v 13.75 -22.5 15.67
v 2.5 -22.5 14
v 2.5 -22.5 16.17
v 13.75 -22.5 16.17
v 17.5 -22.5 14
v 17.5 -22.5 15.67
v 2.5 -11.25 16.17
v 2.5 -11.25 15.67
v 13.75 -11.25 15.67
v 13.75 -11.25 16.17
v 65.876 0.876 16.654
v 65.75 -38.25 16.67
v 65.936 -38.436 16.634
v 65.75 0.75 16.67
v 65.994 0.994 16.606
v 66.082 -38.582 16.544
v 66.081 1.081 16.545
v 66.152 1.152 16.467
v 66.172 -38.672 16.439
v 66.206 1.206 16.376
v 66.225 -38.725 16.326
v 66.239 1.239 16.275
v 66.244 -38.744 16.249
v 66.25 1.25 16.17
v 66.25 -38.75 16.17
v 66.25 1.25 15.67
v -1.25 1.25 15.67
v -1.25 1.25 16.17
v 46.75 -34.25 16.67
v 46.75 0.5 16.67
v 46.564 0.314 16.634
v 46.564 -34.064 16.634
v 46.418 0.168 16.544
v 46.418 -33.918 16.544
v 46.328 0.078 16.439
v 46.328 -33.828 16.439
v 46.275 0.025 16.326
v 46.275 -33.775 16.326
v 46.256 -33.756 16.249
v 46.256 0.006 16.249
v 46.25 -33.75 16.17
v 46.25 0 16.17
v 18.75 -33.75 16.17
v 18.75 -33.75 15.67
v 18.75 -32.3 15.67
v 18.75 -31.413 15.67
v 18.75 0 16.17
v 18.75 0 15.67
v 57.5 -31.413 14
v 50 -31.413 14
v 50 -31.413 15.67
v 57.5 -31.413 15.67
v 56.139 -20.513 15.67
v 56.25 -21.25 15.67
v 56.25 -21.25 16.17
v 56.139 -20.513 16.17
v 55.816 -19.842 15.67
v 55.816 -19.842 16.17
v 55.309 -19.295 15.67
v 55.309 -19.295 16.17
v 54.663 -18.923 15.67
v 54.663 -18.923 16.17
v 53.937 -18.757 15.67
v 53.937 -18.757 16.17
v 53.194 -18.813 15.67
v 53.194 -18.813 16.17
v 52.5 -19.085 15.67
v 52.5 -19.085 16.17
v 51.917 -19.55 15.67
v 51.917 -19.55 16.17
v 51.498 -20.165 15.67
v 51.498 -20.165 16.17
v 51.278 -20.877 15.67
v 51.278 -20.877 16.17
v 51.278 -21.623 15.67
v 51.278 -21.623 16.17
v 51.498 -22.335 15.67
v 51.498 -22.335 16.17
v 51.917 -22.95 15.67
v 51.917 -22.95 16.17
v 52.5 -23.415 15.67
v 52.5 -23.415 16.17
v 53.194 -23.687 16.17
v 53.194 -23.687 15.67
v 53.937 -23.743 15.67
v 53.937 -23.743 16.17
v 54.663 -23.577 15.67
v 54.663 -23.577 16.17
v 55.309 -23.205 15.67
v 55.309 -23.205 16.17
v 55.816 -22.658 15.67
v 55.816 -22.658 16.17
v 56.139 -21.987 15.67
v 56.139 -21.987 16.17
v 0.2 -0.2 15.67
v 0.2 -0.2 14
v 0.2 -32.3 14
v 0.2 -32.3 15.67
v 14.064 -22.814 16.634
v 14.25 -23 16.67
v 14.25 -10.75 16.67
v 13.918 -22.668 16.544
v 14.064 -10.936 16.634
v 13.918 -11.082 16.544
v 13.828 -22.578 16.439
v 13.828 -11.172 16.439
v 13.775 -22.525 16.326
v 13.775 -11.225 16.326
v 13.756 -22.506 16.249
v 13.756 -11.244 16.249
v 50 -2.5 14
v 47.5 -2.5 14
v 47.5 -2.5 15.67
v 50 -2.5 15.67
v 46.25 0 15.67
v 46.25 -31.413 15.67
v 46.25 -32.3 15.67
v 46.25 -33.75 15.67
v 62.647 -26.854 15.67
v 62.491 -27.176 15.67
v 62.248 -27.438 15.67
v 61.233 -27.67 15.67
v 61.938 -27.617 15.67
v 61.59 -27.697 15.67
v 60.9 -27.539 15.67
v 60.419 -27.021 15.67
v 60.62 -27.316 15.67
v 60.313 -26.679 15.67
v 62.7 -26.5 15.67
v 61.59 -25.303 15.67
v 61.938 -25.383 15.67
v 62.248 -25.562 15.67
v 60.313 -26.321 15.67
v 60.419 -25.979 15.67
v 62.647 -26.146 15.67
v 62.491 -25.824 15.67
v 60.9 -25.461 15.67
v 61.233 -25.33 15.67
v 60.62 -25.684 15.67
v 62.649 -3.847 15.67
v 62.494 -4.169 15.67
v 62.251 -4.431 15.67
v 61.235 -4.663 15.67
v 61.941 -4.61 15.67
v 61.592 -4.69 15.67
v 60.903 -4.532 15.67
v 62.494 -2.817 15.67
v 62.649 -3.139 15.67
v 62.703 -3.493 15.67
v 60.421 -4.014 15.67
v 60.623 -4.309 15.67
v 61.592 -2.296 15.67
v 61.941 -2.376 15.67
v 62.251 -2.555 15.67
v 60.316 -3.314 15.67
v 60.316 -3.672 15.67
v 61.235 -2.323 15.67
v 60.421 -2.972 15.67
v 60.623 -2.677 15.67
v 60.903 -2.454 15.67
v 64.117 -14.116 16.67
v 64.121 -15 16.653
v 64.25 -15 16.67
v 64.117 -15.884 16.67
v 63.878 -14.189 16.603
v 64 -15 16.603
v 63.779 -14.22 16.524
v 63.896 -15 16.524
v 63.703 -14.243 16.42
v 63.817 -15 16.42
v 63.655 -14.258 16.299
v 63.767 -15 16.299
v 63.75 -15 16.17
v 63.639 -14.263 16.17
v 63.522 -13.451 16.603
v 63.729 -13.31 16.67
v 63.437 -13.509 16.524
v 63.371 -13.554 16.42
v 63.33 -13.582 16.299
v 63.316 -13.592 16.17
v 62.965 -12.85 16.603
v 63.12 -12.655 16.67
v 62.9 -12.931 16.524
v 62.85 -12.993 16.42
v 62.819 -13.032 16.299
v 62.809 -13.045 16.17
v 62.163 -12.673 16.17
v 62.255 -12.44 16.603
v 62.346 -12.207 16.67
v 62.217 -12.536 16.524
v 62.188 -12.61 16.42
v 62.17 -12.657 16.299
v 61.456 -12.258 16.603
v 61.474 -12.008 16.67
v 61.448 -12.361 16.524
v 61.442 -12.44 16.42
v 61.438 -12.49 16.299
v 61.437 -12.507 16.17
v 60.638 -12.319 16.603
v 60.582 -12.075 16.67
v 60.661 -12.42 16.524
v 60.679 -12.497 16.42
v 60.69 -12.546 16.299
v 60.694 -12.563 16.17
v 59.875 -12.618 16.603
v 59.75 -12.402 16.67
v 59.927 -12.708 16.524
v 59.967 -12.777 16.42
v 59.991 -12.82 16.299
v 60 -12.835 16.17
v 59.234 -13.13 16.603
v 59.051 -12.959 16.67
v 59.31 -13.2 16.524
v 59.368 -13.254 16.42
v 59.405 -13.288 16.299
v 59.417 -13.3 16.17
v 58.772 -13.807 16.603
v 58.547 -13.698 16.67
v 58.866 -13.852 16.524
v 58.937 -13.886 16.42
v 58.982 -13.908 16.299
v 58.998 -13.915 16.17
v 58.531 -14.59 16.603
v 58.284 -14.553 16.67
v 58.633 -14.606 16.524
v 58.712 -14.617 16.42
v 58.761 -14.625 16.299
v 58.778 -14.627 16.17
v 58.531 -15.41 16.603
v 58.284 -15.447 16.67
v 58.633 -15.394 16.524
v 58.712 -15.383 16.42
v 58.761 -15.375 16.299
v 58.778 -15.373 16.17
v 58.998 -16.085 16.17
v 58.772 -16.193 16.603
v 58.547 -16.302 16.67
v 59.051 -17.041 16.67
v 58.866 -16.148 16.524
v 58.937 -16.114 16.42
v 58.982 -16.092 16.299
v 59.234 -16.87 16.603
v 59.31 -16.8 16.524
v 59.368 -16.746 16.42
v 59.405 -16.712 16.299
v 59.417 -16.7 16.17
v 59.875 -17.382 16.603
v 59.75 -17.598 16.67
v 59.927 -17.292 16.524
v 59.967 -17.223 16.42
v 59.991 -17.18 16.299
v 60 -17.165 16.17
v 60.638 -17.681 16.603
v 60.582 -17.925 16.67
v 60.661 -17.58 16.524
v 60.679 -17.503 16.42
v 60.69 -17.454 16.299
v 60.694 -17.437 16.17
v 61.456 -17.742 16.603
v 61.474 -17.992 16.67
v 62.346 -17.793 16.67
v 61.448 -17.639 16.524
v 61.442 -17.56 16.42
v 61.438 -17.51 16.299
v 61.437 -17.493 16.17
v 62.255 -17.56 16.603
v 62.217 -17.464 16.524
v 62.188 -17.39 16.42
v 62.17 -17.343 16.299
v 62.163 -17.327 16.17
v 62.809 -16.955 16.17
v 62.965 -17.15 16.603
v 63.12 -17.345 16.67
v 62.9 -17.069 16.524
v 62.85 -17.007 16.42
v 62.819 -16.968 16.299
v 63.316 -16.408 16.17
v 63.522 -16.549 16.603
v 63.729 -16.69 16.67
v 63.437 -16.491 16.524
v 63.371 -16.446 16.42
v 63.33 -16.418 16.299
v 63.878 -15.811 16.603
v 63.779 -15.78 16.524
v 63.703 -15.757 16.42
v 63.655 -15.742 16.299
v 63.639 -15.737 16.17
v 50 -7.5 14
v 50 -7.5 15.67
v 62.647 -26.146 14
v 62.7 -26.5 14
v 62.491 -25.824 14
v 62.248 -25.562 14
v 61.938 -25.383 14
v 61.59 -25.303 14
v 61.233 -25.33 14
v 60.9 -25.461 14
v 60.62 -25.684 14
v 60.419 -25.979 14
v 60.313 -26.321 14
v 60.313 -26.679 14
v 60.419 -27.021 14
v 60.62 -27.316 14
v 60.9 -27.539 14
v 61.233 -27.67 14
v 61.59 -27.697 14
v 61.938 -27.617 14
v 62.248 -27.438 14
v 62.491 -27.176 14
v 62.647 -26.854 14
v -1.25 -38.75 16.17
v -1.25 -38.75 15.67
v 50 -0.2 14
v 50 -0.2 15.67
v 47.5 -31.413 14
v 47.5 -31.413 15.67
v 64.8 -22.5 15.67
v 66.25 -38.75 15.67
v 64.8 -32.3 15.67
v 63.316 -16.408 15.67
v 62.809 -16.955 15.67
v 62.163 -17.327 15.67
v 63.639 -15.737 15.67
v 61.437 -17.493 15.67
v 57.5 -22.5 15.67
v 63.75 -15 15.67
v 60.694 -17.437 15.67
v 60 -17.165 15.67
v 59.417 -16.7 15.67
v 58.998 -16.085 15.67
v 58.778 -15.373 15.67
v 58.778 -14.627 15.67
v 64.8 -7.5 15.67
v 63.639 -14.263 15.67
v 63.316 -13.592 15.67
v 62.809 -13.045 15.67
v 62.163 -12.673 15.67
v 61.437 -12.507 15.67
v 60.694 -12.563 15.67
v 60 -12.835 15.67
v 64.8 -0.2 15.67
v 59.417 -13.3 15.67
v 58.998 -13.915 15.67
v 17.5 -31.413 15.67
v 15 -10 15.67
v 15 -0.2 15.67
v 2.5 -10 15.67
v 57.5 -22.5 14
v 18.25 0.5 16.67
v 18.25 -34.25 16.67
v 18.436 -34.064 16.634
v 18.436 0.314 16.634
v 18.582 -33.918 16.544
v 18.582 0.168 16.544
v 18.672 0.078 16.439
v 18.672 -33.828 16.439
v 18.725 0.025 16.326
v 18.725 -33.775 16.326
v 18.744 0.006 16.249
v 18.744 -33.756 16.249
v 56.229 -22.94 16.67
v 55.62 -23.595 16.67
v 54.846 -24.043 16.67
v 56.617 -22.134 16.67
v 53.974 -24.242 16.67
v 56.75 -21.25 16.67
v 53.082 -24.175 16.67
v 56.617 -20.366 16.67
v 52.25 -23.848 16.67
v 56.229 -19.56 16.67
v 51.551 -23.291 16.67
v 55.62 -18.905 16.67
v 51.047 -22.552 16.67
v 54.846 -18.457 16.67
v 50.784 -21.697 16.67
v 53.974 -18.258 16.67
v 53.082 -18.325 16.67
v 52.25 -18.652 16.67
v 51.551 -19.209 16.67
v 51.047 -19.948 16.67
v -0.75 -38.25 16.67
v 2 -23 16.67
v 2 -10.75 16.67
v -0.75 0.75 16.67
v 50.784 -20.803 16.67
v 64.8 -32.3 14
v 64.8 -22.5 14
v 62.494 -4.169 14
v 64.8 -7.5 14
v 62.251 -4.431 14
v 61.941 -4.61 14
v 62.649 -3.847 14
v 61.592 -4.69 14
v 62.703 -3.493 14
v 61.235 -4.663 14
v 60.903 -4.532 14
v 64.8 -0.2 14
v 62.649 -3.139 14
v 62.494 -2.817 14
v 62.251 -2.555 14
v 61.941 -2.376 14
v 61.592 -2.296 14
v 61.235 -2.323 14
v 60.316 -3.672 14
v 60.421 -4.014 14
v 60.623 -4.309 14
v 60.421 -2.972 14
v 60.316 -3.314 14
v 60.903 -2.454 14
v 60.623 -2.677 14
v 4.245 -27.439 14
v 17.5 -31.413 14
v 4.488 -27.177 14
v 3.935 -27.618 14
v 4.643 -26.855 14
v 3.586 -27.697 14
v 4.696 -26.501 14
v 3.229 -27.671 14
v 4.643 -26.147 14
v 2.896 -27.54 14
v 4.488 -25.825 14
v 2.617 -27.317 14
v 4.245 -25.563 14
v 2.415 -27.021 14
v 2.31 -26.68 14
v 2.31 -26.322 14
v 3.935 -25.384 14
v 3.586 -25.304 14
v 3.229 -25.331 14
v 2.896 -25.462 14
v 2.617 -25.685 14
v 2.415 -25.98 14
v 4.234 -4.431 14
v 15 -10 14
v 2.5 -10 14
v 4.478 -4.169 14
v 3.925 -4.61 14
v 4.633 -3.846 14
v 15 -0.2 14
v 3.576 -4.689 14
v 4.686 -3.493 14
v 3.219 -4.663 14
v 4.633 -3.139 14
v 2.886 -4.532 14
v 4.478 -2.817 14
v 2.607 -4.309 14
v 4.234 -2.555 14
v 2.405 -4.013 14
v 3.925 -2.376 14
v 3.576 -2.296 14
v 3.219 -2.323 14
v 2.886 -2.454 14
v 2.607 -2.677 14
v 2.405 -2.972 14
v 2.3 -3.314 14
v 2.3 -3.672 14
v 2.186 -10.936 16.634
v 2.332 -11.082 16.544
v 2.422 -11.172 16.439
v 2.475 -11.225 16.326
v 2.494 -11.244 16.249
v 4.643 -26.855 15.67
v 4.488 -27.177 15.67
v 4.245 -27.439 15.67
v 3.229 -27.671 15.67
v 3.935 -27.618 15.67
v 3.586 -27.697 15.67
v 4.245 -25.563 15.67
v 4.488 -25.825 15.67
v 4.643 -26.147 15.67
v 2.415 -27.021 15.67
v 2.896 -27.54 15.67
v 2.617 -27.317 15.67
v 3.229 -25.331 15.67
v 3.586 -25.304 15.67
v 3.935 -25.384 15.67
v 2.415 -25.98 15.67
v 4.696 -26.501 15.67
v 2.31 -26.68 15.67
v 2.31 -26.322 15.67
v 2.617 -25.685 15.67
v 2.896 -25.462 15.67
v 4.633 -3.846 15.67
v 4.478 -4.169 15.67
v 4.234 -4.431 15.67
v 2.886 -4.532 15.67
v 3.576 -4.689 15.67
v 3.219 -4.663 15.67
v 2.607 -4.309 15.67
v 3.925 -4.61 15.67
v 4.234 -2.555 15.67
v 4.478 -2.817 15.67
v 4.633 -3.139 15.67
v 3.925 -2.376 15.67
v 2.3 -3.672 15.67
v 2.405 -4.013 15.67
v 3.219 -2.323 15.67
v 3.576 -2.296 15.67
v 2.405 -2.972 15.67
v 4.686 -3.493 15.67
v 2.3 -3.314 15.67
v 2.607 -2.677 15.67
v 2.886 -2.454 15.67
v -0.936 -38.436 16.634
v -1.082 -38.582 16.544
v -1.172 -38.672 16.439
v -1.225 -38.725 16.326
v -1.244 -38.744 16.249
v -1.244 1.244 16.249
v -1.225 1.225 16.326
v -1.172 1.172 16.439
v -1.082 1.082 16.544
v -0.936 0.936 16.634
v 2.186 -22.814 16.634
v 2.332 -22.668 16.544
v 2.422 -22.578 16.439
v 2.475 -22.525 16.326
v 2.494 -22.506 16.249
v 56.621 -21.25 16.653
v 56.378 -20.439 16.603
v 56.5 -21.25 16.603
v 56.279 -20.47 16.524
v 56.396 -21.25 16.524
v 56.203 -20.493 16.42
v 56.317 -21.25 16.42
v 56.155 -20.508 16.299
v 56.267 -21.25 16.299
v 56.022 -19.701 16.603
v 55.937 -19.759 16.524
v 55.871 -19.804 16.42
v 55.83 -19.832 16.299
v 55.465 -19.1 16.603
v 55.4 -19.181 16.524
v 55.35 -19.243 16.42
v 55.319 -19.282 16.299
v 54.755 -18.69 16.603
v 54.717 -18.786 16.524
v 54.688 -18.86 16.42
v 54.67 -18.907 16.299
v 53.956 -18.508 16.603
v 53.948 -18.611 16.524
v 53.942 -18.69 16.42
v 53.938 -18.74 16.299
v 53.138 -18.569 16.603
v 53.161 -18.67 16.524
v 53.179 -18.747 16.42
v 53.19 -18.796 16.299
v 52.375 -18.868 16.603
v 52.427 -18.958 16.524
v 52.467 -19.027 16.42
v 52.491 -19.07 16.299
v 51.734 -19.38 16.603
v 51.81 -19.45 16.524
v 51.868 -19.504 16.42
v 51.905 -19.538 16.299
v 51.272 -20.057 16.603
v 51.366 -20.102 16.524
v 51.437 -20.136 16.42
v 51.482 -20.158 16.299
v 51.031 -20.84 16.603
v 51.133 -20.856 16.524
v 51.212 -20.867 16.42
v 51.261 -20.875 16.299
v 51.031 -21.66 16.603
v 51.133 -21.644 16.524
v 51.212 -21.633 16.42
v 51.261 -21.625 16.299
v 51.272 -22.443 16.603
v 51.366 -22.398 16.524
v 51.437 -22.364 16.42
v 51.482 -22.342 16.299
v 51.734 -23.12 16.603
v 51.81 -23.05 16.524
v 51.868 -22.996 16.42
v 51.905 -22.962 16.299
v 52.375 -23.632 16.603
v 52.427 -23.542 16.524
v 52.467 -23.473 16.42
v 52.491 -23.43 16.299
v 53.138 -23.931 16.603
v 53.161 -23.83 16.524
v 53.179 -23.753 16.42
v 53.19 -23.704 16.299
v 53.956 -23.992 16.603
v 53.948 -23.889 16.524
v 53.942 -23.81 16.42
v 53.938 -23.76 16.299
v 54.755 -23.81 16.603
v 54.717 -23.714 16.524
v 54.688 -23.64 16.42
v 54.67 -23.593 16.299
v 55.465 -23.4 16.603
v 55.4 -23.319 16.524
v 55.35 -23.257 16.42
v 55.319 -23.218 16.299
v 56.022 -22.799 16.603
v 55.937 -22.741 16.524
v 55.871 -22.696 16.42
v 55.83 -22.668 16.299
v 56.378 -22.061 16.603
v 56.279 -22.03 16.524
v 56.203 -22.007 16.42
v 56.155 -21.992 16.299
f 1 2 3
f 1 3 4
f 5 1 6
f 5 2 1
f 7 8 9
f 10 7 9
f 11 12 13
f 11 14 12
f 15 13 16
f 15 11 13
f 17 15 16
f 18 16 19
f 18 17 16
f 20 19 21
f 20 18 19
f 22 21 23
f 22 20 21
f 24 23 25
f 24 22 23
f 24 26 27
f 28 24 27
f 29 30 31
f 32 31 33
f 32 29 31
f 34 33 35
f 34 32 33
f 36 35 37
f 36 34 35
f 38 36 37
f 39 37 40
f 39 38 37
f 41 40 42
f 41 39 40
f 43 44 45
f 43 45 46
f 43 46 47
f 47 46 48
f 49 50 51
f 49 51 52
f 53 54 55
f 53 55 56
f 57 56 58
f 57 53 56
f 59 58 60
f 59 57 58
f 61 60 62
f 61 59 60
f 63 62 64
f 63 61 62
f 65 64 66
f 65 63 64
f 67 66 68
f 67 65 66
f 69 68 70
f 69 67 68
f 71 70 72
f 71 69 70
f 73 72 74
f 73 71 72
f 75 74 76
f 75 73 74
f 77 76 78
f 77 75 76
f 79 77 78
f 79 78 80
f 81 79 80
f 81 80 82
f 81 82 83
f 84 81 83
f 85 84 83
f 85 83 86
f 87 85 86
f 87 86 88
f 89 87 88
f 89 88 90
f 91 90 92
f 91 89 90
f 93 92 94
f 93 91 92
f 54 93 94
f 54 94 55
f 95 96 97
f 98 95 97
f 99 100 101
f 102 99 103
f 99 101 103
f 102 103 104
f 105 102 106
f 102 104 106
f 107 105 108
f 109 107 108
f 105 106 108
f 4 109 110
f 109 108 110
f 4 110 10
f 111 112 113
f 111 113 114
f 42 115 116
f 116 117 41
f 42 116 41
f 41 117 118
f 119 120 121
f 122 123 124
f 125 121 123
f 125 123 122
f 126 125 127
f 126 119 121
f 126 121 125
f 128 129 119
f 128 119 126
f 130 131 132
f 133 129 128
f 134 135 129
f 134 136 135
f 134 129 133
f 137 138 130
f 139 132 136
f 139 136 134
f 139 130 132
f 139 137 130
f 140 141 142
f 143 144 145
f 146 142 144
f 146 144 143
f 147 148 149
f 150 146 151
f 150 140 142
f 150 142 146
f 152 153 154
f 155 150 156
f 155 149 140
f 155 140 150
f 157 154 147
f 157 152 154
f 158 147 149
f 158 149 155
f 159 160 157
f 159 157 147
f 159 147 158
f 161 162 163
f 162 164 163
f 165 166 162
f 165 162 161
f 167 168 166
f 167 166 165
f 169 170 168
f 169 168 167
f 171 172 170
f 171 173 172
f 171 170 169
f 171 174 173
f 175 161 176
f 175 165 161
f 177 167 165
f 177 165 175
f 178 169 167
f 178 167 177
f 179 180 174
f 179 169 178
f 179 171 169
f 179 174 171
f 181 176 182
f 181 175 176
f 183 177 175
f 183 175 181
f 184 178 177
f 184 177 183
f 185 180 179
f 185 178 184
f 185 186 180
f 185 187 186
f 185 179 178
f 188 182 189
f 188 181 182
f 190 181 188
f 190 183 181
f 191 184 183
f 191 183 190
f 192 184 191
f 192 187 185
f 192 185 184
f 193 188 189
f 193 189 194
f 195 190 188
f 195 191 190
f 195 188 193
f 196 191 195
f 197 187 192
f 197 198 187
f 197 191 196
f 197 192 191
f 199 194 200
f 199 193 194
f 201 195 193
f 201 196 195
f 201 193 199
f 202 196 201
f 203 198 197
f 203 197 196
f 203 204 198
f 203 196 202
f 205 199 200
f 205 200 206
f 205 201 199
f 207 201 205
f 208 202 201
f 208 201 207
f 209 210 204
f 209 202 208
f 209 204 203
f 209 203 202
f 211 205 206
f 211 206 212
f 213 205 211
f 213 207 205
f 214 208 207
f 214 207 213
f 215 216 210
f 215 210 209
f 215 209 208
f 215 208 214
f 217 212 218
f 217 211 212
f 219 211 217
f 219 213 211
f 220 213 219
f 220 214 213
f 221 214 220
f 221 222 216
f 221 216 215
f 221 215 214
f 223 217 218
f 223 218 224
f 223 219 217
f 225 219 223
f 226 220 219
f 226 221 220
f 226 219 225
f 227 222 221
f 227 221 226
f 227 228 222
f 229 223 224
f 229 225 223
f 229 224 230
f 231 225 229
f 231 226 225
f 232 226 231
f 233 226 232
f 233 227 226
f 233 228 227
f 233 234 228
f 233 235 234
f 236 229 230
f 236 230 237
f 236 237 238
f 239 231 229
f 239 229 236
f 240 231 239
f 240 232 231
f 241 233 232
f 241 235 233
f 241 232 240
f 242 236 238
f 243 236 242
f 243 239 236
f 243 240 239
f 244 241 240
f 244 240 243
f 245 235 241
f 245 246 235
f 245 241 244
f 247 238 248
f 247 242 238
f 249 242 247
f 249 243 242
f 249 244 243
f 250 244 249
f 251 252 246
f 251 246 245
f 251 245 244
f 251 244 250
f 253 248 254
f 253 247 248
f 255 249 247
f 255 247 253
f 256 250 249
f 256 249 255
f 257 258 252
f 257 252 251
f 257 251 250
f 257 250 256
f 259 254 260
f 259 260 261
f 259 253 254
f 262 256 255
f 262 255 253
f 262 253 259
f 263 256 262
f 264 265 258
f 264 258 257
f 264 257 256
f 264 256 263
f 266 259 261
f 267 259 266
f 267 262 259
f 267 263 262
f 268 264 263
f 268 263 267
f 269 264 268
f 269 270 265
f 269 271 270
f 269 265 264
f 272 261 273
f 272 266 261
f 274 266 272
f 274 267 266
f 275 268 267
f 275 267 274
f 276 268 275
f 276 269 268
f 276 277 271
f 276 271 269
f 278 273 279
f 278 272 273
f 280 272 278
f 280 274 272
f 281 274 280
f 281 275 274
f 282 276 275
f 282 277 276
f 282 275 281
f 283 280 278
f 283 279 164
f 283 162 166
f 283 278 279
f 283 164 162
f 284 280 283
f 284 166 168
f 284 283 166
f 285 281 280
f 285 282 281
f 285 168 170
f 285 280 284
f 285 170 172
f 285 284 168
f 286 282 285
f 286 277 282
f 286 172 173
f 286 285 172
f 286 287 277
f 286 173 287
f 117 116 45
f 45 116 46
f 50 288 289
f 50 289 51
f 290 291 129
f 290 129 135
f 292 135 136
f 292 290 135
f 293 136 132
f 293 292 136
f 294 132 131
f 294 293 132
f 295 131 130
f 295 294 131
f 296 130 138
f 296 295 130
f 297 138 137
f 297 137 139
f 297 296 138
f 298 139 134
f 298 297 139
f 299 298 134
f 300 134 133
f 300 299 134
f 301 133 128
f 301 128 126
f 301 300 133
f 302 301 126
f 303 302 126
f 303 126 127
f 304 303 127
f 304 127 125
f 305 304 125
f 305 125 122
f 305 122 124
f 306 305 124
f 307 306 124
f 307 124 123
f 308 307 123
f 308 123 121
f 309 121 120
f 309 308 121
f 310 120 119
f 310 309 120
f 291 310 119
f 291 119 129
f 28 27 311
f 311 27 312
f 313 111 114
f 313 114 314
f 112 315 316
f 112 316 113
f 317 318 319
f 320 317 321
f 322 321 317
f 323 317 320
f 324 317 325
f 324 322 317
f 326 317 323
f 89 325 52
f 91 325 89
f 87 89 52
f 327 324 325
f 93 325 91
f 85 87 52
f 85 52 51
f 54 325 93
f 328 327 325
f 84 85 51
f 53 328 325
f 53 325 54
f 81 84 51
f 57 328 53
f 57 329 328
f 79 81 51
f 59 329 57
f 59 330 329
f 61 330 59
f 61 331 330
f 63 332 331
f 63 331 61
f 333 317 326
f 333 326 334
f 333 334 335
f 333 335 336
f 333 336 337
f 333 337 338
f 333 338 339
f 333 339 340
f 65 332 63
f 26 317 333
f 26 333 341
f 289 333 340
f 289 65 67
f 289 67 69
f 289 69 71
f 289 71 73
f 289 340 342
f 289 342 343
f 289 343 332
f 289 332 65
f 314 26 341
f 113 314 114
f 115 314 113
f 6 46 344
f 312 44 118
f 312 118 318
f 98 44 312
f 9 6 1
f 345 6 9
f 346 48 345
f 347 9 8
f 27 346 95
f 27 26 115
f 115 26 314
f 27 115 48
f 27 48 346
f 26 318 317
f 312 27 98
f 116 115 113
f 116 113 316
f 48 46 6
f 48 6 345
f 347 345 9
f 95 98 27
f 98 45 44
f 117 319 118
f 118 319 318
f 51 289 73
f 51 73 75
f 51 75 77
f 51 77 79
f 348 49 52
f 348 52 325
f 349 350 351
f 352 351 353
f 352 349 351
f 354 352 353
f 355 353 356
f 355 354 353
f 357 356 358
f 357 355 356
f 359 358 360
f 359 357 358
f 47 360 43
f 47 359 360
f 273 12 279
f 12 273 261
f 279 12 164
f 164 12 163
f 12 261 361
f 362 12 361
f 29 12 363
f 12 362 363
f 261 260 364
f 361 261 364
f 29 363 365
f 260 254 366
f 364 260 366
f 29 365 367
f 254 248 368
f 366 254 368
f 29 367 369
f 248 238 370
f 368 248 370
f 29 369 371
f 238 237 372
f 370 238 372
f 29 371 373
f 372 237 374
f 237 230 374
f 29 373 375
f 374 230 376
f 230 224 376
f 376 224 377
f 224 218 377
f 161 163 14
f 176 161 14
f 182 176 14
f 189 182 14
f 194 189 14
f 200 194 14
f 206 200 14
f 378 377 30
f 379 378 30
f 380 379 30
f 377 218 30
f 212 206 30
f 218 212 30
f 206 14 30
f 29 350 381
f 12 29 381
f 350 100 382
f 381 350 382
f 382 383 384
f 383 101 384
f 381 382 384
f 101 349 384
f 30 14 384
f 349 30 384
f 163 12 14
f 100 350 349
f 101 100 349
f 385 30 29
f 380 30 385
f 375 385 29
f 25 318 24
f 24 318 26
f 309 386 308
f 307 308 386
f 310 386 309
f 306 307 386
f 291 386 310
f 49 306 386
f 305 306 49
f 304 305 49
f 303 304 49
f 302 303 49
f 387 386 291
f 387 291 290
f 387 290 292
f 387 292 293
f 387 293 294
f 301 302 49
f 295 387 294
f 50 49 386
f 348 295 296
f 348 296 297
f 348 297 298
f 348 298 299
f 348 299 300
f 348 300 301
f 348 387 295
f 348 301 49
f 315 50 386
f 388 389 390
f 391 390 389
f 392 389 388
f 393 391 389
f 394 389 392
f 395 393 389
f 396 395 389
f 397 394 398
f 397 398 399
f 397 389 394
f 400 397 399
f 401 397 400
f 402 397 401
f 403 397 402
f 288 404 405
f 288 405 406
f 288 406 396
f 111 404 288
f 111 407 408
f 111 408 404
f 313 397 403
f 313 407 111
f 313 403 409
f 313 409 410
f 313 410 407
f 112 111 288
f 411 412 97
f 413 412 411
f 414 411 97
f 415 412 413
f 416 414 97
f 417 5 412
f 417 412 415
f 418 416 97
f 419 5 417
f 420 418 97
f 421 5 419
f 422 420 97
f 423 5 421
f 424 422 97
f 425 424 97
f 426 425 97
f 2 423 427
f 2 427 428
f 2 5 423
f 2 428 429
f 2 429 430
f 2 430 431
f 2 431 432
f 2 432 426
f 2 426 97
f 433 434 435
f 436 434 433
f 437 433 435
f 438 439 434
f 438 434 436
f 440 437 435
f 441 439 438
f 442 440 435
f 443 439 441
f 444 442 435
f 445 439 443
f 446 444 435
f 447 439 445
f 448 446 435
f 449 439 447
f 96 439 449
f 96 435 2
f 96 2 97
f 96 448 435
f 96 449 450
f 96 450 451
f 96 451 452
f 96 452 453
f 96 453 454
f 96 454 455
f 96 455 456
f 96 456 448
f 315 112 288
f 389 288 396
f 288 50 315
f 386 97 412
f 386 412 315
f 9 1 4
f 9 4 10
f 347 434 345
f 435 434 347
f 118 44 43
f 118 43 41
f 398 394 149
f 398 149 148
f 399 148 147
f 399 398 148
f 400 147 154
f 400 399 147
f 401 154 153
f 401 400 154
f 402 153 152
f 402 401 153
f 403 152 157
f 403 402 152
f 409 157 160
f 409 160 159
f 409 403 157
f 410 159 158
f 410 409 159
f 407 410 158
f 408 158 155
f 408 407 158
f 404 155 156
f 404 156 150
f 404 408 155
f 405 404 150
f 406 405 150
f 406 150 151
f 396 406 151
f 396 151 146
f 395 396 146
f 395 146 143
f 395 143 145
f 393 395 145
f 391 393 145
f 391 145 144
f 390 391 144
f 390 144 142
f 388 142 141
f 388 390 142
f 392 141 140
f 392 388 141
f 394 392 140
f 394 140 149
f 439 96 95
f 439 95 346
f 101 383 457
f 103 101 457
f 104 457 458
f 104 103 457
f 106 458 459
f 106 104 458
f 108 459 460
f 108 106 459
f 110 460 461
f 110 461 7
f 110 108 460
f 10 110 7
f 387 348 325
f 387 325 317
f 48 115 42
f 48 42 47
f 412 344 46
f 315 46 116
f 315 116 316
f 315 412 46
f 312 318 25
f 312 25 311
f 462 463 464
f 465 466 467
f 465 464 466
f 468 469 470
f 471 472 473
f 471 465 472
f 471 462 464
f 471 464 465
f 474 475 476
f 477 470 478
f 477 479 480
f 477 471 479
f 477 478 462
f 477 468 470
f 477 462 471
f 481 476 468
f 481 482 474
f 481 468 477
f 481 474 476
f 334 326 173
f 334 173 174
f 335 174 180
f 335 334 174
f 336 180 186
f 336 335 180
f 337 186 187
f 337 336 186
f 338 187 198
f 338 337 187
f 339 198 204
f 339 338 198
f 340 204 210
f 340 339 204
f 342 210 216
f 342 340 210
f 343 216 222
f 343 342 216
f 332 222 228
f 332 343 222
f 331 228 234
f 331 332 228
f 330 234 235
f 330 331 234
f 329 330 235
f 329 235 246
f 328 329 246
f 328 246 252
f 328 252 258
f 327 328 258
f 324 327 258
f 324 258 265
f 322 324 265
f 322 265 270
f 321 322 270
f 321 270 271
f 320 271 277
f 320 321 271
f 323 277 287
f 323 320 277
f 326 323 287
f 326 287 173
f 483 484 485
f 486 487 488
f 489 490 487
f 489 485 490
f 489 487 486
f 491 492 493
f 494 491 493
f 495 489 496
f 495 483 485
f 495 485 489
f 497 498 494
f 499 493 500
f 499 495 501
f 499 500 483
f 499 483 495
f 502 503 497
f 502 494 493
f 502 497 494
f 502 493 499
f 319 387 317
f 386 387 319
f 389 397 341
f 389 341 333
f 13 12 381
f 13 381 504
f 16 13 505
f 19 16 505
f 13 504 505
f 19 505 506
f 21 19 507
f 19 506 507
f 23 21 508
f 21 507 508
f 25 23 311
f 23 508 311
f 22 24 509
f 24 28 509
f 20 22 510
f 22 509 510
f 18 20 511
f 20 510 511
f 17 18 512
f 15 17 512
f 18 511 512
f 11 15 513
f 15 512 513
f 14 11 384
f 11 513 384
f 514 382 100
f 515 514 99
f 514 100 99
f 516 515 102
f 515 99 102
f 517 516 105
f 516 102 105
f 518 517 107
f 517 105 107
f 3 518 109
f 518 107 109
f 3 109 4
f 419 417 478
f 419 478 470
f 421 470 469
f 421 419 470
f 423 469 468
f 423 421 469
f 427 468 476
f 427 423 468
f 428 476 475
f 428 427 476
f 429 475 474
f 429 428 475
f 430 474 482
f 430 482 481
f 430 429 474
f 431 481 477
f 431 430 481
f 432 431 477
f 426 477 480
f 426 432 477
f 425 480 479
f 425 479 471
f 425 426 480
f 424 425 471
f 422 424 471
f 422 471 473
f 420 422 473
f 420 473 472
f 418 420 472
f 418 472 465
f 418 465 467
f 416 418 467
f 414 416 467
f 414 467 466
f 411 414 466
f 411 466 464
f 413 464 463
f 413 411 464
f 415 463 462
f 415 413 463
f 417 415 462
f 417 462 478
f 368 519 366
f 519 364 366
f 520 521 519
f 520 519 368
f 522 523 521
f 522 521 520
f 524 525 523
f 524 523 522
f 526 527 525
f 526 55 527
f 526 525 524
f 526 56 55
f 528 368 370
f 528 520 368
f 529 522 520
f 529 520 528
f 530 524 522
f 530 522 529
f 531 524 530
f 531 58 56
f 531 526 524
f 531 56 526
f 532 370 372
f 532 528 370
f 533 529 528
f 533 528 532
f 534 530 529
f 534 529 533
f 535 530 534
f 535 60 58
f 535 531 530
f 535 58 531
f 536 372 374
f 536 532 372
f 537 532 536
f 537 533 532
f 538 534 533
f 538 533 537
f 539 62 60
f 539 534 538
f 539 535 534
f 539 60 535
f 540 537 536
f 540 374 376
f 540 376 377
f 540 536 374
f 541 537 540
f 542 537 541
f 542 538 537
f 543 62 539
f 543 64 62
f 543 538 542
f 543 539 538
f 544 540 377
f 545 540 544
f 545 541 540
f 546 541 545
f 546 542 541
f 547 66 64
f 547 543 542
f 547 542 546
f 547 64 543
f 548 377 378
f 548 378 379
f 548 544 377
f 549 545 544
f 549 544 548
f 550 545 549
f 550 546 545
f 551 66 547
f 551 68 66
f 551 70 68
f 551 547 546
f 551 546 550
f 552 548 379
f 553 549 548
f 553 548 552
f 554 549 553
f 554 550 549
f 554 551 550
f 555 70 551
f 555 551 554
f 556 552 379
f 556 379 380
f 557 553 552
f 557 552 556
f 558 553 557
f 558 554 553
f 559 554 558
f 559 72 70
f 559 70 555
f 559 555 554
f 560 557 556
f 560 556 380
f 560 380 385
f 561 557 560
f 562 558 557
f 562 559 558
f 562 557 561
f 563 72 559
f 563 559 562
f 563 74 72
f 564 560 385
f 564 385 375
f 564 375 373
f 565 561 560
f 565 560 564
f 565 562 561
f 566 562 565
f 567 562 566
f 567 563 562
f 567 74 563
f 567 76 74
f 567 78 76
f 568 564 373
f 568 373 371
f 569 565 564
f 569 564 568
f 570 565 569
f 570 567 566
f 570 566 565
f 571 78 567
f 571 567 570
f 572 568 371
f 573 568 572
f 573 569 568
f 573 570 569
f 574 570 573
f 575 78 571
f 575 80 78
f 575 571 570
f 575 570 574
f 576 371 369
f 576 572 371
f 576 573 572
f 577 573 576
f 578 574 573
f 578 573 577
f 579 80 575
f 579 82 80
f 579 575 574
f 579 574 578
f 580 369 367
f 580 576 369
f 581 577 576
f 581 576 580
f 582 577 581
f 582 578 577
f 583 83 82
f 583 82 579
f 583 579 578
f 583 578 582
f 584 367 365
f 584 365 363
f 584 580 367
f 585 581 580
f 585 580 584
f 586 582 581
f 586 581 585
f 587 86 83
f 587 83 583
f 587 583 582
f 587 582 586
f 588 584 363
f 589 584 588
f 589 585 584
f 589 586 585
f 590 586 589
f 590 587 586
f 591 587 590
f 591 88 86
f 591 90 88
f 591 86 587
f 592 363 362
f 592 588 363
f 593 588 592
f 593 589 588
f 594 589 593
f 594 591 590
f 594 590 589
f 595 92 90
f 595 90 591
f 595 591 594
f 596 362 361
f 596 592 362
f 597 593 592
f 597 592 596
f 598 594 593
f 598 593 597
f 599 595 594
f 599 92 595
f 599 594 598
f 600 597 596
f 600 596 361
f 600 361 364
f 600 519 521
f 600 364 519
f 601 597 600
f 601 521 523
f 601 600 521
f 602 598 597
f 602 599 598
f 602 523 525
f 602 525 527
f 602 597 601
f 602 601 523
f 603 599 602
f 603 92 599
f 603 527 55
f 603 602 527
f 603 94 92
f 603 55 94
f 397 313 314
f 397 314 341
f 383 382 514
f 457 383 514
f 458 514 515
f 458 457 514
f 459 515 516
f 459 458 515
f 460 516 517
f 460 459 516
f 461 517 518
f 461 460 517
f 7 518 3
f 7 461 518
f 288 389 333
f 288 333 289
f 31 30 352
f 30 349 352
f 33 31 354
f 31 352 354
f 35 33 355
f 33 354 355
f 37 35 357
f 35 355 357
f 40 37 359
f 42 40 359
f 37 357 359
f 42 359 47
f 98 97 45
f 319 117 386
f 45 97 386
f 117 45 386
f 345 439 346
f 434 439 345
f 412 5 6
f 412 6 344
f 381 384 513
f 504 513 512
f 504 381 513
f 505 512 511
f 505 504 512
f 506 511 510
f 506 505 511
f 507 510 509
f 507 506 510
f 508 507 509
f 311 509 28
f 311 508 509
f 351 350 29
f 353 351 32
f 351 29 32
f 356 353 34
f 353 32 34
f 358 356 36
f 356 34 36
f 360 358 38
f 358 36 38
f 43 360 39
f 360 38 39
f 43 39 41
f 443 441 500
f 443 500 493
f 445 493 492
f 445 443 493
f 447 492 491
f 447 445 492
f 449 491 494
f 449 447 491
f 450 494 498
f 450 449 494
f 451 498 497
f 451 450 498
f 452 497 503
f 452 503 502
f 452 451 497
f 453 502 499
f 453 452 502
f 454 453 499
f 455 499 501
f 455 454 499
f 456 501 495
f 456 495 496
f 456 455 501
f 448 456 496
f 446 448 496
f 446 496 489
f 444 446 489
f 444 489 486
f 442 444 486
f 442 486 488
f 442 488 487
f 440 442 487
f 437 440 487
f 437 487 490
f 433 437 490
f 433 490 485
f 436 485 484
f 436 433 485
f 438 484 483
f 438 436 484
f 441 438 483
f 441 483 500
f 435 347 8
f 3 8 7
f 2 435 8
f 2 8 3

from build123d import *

# Parameters (mm, degrees)
SKETCH026_R  = 1.2
PAD023_DEPTH = 1.67
SKETCH027_R  = 2.5
SKETCH027_W  = 11.25
SKETCH027_H  = 11.25
PAD024_DEPTH = 1
FILLET005_R  = 0.5


with BuildPart() as part:
    # Sketch026 → Pad023 (new body)
    with BuildSketch(Plane.XY):
        Polygon((0.2, -0.2), (15, -0.2), (15, -10), (2.5, -10), (2.5, -22.5), (17.5, -22.5), (17.5, -31.412779), (47.5, -31.412779), (47.5, -2.5), (50, -2.5), (50, -0.2), (64.8, -0.2), (64.8, -7.5), (50, -7.5), (50, -31.412779), (57.5, -31.412779), (57.5, -22.5), (64.8, -22.5), (64.8, -32.3), (60, -32.3), (17.5, -32.3), (0.2, -32.3), (0.2, -22.5), (0.2, -10), align=None)
        with Locations((3.496368, -26.500834)):
            Circle(SKETCH026_R, mode=Mode.SUBTRACT)
        with Locations((3.486166, -3.492743)):
            Circle(SKETCH026_R, mode=Mode.SUBTRACT)
        with Locations((61.502525, -3.493081)):
            Circle(SKETCH026_R, mode=Mode.SUBTRACT)
        with Locations((61.5, -26.5)):
            Circle(SKETCH026_R, mode=Mode.SUBTRACT)
    extrude(amount=PAD023_DEPTH)

    # Sketch027 (on Face30 of Pad023) → Pad024 (join)
    with BuildSketch(Plane.XY.offset(1.67)):
        Polygon((-1.25, 1.25), (18.75, 1.25), (46.25, 1.25), (66.25, 1.25), (66.25, -11.25), (66.25, -18.75), (66.25, -33.75), (66.25, -38.75), (-1.25, -38.75), (-1.25, -33.75), (-1.25, -12.5), align=None)
        with Locations((61.25, -15)):
            Circle(SKETCH027_R, mode=Mode.SUBTRACT)
        with Locations((53.75, -21.25)):
            Circle(SKETCH027_R, mode=Mode.SUBTRACT)
        Polygon((18.75, 0), (18.75, -12.5), (18.75, -33.75), (46.25, -33.75), (46.25, -17.5), (46.25, -11.25), (46.25, 0), align=None, mode=Mode.SUBTRACT)
        with Locations((8.125, -16.875)):
            Rectangle(SKETCH027_W, SKETCH027_H, mode=Mode.SUBTRACT)
    extrude(amount=PAD024_DEPTH)

    # Fillet005
    fillet005_edges = [part.edges().sort_by_distance(p)[0] for p in [
        (-1.25, -5.625, 2.67),
        (8.75, 1.25, 2.67),
        (32.5, 1.25, 2.67),
        (56.25, 1.25, 2.67),
        (66.25, -5, 2.67),
        (66.25, -15, 2.67),
        (66.25, -26.25, 2.67),
        (66.25, -36.25, 2.67),
        (32.5, -38.75, 2.67),
        (-1.25, -36.25, 2.67),
        (-1.25, -23.125, 2.67),
        (18.75, -6.25, 2.67),
        (18.75, -23.125, 2.67),
        (32.5, -33.75, 2.67),
        (46.25, -25.625, 2.67),
        (46.25, -14.375, 2.67),
        (46.25, -5.625, 2.67),
        (32.5, 0, 2.67),
        (2.5, -16.875, 2.67),
        (8.125, -22.5, 2.67),
        (13.75, -16.875, 2.67),
        (8.125, -11.25, 2.67),
        (51.25, -21.25, 2.67),
        (58.75, -15, 2.67),
    ]]
    fillet(fillet005_edges, radius=FILLET005_R)


with BuildPart() as part_1:
    # Body004 placement: moved
    add(part.part.moved(Location((0, 0, 14))))


solid = part_1.part
